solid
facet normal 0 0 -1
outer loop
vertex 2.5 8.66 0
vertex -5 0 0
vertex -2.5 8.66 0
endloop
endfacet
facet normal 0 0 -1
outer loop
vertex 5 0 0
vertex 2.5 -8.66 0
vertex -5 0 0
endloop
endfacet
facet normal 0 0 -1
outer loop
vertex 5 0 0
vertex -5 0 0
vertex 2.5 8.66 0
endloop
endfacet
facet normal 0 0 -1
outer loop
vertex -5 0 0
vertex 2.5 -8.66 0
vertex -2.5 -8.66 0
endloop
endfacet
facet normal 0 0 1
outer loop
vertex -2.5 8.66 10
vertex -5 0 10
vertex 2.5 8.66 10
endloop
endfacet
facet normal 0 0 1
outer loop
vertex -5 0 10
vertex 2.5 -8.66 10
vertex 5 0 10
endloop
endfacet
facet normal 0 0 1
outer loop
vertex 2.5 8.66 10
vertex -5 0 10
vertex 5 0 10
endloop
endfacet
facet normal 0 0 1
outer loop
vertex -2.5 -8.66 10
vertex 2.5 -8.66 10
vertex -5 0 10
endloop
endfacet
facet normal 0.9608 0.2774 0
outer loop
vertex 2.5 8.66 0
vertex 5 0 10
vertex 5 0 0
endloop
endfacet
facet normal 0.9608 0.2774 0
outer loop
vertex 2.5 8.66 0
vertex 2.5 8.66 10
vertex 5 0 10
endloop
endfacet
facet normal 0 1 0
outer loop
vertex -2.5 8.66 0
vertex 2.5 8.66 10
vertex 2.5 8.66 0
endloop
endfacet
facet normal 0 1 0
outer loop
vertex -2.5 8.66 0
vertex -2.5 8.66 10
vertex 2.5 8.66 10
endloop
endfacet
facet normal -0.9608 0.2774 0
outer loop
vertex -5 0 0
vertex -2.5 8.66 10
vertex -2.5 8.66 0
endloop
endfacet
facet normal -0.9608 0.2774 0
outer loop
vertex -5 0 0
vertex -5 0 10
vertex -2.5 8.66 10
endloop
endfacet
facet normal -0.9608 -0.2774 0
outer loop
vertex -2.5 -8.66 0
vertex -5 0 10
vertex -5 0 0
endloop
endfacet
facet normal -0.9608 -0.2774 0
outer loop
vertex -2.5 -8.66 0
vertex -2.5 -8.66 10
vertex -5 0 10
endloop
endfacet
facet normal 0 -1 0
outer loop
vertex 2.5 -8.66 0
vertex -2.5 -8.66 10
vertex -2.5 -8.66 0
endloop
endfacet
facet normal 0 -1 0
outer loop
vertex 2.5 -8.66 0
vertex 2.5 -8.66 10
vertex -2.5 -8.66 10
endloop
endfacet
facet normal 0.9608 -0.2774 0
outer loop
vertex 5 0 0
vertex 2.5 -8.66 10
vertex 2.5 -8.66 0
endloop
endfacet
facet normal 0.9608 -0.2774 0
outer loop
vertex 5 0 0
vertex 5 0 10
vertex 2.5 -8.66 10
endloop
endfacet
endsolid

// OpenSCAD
s = 10; // side length of the hexagonal base
h = 10; // height of the prism

r_outer = s / sqrt(3);

module hexagon(s) {
    polygon(points=[
        [s/2, 0],
        [s/4, s*sqrt(3)/2],
        [-s/4, s*sqrt(3)/2],
        [-s/2, 0],
        [-s/4, -s*sqrt(3)/2],
        [s/4, -s*sqrt(3)/2]
    ]);
}

module hexagonal_prism(s, h) {
    linear_extrude(height=h)
        hexagon(s);
}

hexagonal_prism(s, h);
